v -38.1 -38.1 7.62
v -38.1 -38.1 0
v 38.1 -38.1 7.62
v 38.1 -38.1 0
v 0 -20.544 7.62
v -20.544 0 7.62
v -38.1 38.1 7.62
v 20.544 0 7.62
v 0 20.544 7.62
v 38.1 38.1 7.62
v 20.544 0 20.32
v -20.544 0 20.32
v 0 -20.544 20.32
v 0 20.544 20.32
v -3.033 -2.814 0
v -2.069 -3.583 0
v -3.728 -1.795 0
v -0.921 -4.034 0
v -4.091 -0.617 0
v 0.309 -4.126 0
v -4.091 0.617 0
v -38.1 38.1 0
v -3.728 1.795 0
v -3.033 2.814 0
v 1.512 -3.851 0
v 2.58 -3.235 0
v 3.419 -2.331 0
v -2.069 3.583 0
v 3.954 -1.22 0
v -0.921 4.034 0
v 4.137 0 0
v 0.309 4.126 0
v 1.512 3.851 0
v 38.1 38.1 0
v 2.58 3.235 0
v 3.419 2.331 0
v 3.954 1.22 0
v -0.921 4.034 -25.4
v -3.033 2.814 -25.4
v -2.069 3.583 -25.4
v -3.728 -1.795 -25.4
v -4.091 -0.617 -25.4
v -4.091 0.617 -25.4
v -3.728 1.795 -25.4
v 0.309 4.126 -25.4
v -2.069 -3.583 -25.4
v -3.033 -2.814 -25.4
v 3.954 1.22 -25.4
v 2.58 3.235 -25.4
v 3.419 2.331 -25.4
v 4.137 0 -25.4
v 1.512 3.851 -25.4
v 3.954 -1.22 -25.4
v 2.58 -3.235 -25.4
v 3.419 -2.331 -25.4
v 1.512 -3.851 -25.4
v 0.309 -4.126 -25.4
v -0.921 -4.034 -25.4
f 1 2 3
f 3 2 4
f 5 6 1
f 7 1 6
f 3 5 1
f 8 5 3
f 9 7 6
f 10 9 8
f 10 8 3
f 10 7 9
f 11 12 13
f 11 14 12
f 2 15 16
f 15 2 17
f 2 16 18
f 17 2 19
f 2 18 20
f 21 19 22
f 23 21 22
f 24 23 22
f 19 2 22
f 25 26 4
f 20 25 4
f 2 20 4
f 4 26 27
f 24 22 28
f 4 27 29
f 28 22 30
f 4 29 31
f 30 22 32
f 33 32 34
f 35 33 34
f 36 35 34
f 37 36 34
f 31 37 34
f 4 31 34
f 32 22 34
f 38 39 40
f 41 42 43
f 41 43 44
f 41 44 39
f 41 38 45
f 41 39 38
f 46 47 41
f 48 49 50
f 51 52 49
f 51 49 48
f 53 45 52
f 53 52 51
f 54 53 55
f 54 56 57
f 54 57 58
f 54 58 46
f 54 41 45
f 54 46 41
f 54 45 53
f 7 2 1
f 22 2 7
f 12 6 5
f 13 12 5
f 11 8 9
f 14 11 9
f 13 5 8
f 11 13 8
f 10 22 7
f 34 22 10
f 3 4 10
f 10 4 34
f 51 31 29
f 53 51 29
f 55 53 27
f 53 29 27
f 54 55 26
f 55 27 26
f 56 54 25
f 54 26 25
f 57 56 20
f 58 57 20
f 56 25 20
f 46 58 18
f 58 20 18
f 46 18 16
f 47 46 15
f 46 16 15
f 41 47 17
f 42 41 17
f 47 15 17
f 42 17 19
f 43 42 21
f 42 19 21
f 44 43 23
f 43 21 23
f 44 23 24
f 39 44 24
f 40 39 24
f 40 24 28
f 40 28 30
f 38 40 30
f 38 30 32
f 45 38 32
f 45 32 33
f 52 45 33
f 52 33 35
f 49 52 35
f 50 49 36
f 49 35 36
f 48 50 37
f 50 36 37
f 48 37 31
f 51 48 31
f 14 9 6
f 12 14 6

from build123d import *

# Parameters (mm, degrees)
F0_W     = 76.2
F0_H     = 76.2
F1_DEPTH = 7.62
F3_DEPTH = 12.7
F4_R     = 4.137454
F5_DEPTH = 25.4


with BuildPart() as f1:
    # F0 (on Top) → F1 (new body)
    with BuildSketch(Plane.XY):
        Rectangle(F0_W, F0_H)
    extrude(amount=F1_DEPTH)

    # F2 (on face) → F3 (join)
    with BuildSketch(Plane.XY.offset(7.62)):
        Polygon((-20.543544, 0), (0, -20.543544), (20.543544, 0), (0, 20.543544), align=None)
    extrude(amount=F3_DEPTH)

    # F4 (on face) → F5 (join)
    with BuildSketch(Plane(origin=(0, 0, 0), x_dir=(1, 0, 0), z_dir=(0, 0, -1))):
        Circle(F4_R)
    extrude(amount=F5_DEPTH)


solid = f1.part
